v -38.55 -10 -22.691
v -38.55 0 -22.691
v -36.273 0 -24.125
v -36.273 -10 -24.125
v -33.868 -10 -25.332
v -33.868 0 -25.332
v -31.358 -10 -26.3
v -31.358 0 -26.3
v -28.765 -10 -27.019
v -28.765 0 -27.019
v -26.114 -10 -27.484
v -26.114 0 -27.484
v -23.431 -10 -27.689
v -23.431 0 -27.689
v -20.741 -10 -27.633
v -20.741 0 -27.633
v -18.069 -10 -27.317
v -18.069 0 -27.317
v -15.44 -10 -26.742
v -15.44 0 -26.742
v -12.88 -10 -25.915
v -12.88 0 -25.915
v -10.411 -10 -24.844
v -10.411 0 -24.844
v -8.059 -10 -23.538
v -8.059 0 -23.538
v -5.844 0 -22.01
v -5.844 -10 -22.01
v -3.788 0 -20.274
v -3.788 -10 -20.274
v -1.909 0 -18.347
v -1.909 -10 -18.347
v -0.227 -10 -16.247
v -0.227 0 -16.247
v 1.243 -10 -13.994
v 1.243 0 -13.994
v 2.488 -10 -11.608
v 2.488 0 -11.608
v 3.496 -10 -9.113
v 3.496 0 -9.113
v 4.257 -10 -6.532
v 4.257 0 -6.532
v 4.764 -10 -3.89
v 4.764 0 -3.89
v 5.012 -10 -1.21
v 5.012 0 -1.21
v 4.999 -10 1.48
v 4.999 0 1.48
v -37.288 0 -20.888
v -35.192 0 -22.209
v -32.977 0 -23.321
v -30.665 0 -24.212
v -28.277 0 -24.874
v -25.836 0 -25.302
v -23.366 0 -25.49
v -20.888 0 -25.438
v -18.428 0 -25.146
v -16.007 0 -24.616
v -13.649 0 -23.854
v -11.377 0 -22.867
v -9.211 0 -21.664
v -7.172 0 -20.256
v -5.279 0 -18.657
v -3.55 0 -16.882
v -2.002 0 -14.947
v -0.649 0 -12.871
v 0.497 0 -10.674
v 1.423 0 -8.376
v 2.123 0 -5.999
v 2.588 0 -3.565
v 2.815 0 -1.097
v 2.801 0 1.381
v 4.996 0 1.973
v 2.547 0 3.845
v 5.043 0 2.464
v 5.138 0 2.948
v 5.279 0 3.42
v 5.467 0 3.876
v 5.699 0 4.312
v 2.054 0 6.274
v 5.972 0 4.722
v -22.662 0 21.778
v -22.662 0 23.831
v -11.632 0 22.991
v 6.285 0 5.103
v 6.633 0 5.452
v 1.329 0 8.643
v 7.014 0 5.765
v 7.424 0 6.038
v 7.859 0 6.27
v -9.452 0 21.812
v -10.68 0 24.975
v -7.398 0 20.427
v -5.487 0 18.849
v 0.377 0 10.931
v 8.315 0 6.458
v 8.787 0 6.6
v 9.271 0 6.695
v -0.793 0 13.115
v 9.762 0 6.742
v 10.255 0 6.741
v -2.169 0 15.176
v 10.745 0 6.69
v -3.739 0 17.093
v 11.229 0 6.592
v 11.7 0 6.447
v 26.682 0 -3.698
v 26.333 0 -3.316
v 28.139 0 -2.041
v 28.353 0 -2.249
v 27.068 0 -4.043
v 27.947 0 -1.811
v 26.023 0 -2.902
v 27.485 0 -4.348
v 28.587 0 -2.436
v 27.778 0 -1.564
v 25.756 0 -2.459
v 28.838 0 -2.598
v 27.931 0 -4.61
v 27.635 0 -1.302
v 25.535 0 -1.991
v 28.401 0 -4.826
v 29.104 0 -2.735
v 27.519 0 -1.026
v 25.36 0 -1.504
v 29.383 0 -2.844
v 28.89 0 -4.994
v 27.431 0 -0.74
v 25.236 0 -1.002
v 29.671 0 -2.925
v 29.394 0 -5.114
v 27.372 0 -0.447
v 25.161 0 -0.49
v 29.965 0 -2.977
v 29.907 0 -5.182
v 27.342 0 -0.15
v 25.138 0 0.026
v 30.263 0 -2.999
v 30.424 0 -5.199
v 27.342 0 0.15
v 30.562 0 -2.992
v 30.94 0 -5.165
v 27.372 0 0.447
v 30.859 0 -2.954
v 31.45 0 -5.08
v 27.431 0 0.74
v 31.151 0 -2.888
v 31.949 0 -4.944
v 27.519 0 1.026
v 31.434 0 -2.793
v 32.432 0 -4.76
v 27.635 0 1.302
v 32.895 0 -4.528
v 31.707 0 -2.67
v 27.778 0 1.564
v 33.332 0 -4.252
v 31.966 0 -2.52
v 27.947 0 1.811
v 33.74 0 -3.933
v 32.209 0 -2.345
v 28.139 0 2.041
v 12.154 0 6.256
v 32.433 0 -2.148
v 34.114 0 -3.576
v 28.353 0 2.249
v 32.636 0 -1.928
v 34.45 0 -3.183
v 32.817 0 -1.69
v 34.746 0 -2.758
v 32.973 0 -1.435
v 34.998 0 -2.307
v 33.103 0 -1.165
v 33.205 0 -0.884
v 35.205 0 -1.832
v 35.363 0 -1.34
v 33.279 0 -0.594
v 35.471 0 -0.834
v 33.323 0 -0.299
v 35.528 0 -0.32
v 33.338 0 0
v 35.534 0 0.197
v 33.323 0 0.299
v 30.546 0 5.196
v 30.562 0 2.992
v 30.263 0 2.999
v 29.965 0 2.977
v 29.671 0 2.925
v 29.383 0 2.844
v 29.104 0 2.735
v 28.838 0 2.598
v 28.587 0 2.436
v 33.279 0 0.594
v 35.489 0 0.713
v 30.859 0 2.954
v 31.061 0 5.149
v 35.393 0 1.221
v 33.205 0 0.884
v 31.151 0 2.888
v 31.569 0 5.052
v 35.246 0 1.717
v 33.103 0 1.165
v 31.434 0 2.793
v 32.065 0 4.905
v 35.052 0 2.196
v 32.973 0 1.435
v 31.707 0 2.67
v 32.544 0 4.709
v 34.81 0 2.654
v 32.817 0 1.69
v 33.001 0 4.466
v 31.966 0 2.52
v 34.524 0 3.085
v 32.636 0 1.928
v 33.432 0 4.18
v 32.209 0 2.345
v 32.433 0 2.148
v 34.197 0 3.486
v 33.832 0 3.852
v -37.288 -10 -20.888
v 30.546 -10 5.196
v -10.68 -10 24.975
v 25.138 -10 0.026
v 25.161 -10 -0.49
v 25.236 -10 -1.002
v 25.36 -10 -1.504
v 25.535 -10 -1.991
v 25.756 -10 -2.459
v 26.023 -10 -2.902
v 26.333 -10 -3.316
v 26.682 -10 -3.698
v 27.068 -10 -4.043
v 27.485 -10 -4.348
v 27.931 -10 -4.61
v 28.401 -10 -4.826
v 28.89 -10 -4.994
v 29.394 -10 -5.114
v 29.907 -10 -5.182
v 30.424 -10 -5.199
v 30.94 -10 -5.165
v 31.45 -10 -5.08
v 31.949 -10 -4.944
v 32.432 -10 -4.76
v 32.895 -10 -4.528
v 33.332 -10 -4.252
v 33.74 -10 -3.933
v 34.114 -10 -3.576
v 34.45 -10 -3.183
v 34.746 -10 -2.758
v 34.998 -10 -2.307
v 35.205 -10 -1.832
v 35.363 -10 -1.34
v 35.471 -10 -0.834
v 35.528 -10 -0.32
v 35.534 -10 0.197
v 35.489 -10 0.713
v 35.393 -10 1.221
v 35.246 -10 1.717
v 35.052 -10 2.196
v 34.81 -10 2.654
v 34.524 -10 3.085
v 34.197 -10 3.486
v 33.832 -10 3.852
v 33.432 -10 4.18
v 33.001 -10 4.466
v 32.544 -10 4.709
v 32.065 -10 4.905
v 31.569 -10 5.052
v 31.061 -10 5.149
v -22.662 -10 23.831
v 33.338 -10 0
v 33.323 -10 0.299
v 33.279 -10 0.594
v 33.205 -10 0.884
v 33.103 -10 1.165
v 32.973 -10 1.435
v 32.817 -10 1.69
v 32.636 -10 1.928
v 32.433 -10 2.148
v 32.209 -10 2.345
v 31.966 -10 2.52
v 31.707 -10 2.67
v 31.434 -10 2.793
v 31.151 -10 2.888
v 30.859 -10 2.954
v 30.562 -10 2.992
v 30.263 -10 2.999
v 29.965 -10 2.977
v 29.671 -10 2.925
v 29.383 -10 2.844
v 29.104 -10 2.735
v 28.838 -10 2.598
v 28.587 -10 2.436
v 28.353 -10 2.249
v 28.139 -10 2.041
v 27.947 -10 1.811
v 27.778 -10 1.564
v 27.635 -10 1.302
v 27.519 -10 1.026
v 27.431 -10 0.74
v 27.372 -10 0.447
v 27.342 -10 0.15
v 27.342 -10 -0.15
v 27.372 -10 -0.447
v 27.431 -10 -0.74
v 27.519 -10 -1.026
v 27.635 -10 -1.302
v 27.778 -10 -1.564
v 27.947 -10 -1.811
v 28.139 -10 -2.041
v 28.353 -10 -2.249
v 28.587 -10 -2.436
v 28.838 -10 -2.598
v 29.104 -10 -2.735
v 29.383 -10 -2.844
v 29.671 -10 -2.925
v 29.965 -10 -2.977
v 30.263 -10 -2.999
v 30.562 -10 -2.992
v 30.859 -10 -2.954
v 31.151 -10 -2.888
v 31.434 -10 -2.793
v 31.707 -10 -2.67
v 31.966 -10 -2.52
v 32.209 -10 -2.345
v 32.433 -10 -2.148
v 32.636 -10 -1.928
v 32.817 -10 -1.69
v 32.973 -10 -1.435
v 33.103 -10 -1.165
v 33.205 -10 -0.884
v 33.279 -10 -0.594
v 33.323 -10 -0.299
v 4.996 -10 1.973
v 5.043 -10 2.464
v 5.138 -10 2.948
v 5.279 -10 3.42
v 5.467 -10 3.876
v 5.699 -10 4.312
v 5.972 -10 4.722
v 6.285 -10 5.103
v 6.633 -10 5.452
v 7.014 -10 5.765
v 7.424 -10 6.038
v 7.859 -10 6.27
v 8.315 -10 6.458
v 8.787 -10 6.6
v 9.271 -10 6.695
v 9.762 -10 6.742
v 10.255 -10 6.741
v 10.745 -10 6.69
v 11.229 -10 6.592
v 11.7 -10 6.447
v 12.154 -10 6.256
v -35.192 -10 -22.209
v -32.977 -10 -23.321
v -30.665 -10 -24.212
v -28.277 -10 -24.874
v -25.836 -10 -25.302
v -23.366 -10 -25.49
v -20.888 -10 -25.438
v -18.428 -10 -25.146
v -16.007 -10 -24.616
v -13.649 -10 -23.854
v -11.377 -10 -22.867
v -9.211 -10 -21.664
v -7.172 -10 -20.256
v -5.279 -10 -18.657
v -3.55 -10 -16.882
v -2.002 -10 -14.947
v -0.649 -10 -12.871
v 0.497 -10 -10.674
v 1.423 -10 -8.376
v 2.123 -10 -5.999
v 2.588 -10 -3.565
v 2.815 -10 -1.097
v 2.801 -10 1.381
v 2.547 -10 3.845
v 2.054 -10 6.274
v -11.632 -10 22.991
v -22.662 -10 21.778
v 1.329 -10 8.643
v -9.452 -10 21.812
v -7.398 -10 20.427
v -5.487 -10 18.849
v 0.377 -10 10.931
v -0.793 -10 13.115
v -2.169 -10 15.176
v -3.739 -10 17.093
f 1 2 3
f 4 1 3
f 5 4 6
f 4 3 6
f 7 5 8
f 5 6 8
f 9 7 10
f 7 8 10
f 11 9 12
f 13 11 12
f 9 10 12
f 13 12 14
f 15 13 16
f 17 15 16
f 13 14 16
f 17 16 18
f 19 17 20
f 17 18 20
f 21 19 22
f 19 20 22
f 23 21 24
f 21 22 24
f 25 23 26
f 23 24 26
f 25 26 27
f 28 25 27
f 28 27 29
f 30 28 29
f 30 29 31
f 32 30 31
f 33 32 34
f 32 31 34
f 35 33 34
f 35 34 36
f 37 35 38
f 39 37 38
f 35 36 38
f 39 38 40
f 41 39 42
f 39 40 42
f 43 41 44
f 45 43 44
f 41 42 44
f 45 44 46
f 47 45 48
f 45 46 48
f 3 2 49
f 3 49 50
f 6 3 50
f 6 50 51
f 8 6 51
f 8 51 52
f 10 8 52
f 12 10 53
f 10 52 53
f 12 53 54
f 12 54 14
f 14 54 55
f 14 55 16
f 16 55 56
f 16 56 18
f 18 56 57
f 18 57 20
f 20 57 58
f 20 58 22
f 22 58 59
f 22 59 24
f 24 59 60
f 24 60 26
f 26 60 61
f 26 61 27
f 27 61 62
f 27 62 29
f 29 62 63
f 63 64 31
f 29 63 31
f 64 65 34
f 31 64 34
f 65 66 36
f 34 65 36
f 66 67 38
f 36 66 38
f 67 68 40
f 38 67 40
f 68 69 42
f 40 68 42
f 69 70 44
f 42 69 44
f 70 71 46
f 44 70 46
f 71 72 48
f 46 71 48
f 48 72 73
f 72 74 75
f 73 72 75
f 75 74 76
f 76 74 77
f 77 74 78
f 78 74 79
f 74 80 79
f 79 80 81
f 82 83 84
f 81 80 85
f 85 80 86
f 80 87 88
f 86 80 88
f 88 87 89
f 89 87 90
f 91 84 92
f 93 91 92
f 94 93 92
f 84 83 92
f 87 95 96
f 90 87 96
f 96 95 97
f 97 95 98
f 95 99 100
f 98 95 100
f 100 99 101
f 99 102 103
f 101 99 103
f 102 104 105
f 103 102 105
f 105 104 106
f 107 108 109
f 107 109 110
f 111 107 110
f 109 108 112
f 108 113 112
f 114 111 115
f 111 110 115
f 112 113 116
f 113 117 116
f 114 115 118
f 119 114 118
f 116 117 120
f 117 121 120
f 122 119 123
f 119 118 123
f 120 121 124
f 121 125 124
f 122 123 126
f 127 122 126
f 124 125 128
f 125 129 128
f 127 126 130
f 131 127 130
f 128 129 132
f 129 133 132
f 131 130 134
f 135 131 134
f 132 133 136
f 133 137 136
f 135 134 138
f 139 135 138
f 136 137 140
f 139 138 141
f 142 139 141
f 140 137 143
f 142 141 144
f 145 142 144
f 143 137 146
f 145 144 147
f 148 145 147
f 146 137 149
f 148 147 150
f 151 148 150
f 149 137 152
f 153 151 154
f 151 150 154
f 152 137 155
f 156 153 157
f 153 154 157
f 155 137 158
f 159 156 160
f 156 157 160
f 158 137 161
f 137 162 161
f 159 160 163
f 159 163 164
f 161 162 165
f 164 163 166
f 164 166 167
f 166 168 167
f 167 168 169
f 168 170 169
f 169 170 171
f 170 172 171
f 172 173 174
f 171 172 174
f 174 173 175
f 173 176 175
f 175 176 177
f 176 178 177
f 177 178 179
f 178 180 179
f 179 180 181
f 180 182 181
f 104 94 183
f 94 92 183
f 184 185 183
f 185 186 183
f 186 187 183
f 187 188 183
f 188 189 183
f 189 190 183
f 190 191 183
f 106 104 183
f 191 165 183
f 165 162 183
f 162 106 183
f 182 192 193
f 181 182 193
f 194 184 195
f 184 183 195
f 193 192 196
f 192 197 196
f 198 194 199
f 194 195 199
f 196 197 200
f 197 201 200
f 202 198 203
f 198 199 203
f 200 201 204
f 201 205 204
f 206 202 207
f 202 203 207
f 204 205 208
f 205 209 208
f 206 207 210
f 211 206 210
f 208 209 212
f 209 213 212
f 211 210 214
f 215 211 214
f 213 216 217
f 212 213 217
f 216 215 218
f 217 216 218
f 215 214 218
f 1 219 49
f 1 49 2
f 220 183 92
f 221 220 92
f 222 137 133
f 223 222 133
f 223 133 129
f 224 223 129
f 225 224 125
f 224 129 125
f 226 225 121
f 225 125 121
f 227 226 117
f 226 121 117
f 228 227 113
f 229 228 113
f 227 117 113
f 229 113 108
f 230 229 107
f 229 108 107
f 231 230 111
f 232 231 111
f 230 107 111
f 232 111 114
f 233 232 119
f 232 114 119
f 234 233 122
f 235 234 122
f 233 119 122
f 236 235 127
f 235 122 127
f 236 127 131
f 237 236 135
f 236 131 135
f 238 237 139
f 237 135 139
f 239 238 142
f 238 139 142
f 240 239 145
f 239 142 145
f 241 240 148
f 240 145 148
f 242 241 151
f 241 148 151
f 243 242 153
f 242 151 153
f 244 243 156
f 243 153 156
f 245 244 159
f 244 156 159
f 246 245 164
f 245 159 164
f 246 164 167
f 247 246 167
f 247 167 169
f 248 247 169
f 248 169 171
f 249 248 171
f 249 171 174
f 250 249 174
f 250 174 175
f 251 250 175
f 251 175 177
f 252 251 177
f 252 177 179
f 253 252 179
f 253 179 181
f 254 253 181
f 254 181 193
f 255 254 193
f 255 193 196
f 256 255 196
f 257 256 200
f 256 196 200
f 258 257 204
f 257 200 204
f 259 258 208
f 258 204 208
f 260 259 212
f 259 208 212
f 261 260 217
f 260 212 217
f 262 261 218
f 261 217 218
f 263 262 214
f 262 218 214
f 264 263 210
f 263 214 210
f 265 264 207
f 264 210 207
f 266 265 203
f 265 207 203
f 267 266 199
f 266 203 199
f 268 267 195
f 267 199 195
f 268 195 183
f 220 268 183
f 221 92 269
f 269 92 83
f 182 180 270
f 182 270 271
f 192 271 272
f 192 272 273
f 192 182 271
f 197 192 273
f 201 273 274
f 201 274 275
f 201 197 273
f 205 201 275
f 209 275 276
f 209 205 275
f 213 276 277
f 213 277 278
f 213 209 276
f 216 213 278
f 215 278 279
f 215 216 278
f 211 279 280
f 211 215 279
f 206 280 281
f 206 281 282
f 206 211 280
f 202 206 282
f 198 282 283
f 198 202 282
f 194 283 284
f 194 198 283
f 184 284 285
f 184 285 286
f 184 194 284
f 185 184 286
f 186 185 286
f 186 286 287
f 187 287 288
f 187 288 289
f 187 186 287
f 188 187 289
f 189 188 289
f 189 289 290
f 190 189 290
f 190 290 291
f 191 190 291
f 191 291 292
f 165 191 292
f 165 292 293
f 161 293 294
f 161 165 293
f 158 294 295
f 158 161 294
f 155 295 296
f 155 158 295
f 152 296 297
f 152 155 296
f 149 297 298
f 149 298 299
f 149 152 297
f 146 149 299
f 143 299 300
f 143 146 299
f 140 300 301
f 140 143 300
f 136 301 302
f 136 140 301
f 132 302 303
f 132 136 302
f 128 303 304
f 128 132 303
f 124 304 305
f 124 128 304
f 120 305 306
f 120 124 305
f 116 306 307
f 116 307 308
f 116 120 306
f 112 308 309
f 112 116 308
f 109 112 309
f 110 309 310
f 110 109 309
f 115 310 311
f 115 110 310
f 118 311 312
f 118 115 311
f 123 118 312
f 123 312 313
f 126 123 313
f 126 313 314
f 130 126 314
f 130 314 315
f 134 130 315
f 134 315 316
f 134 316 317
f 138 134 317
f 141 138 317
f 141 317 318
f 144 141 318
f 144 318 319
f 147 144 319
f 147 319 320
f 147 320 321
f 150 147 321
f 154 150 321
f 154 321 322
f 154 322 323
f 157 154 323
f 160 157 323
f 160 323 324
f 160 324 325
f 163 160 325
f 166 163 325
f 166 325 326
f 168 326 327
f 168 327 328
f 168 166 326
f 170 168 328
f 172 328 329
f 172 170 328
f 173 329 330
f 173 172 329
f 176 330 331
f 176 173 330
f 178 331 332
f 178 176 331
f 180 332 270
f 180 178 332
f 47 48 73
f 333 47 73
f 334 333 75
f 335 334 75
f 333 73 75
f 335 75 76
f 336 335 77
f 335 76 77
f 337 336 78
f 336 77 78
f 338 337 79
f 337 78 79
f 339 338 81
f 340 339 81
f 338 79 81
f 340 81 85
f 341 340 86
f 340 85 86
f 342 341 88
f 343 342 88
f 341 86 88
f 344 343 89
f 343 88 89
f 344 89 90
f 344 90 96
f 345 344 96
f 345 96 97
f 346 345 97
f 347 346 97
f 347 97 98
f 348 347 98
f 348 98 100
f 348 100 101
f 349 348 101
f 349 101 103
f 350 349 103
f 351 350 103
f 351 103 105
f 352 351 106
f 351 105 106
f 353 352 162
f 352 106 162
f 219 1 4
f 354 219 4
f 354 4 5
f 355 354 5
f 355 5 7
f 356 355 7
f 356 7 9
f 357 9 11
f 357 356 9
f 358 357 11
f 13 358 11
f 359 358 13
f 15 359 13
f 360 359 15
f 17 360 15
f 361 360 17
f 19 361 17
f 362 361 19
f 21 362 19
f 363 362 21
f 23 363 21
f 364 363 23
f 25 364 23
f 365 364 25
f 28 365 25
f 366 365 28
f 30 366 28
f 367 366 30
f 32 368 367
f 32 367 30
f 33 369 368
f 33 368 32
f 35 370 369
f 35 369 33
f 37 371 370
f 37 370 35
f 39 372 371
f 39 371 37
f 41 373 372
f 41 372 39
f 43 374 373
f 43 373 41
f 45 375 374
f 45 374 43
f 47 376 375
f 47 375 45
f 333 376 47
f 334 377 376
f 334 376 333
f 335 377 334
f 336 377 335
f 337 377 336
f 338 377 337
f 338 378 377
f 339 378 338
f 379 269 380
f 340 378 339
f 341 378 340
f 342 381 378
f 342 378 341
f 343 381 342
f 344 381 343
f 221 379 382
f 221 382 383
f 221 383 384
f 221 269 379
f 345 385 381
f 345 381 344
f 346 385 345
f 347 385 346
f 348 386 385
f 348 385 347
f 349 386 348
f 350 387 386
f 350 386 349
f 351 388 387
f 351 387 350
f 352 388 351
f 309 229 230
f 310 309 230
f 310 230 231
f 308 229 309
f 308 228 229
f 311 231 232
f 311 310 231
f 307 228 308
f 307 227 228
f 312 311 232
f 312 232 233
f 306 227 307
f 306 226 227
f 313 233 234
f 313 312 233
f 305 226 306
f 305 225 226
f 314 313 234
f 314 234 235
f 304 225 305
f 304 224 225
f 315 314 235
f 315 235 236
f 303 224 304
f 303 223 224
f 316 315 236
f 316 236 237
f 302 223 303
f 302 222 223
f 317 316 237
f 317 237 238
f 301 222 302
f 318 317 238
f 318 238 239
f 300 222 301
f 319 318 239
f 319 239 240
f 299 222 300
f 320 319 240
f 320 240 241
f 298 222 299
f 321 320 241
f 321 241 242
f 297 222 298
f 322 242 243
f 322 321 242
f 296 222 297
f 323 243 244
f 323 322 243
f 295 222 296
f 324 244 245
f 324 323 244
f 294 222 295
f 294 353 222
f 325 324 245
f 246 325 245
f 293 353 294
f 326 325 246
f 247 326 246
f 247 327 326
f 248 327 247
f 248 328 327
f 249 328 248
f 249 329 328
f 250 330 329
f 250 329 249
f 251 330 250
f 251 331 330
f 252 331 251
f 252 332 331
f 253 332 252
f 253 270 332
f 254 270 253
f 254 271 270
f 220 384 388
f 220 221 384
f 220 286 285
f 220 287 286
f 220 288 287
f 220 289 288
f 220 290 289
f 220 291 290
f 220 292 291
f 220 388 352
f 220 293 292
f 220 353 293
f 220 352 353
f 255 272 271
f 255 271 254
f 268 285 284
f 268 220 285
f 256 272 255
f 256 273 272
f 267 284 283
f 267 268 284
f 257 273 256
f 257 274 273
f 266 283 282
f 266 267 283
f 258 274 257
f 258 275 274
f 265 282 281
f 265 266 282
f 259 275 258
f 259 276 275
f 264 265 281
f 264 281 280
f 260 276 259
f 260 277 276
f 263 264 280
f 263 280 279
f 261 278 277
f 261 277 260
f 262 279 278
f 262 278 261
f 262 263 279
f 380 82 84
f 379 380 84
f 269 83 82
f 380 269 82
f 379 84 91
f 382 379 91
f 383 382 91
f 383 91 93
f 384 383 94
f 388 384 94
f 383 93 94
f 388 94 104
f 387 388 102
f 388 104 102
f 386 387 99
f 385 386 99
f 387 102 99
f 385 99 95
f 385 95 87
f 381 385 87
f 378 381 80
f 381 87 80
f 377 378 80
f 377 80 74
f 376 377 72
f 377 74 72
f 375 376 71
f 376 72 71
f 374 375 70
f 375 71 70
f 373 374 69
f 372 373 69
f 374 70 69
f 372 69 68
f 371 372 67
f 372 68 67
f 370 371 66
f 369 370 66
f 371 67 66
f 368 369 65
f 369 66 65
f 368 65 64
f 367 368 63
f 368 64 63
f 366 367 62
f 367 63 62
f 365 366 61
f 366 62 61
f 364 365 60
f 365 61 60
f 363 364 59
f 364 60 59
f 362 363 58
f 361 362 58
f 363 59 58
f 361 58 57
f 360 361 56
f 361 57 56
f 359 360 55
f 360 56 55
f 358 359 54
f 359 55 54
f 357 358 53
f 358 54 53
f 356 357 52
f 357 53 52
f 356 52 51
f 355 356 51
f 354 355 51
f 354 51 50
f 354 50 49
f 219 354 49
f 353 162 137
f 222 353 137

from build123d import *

# Parameters (mm, degrees)
F0_R     = 3
F1_DEPTH = 10


with BuildPart() as f1:
    # F0 (on Front) → F1 (new body)
    with BuildSketch(Plane.XZ):
        with BuildLine():
            ThreePointArc((-11.631738, 22.991001), (-0.648629, -12.871174), (-37.288071, -20.888377))
            Line((-37.288071, -20.888377), (-38.549939, -22.690512))
            ThreePointArc((-38.549939, -22.690512), (-9.219197, -24.219506), (4.998539, 1.480421))
            ThreePointArc((4.998539, 1.480421), (7.215942, 5.906596), (12.154164, 6.255685))
            Line((12.154164, 6.255685), (25.138195, 0.026482))
            ThreePointArc((25.138195, 0.026482), (33.931194, -3.758973), (30.546238, 5.195834))
            Line((30.546238, 5.195834), (-10.680119, 24.974539))
            Line((-10.680119, 24.974539), (-22.661872, 23.830803))
            Line((-22.661872, 23.830803), (-22.661872, 21.77806))
            Line((-22.661872, 21.77806), (-11.631738, 22.991001))
        make_face()
        with Locations((30.338128, 0)):
            Circle(F0_R, mode=Mode.SUBTRACT)
    extrude(amount=F1_DEPTH)


solid = f1.part
